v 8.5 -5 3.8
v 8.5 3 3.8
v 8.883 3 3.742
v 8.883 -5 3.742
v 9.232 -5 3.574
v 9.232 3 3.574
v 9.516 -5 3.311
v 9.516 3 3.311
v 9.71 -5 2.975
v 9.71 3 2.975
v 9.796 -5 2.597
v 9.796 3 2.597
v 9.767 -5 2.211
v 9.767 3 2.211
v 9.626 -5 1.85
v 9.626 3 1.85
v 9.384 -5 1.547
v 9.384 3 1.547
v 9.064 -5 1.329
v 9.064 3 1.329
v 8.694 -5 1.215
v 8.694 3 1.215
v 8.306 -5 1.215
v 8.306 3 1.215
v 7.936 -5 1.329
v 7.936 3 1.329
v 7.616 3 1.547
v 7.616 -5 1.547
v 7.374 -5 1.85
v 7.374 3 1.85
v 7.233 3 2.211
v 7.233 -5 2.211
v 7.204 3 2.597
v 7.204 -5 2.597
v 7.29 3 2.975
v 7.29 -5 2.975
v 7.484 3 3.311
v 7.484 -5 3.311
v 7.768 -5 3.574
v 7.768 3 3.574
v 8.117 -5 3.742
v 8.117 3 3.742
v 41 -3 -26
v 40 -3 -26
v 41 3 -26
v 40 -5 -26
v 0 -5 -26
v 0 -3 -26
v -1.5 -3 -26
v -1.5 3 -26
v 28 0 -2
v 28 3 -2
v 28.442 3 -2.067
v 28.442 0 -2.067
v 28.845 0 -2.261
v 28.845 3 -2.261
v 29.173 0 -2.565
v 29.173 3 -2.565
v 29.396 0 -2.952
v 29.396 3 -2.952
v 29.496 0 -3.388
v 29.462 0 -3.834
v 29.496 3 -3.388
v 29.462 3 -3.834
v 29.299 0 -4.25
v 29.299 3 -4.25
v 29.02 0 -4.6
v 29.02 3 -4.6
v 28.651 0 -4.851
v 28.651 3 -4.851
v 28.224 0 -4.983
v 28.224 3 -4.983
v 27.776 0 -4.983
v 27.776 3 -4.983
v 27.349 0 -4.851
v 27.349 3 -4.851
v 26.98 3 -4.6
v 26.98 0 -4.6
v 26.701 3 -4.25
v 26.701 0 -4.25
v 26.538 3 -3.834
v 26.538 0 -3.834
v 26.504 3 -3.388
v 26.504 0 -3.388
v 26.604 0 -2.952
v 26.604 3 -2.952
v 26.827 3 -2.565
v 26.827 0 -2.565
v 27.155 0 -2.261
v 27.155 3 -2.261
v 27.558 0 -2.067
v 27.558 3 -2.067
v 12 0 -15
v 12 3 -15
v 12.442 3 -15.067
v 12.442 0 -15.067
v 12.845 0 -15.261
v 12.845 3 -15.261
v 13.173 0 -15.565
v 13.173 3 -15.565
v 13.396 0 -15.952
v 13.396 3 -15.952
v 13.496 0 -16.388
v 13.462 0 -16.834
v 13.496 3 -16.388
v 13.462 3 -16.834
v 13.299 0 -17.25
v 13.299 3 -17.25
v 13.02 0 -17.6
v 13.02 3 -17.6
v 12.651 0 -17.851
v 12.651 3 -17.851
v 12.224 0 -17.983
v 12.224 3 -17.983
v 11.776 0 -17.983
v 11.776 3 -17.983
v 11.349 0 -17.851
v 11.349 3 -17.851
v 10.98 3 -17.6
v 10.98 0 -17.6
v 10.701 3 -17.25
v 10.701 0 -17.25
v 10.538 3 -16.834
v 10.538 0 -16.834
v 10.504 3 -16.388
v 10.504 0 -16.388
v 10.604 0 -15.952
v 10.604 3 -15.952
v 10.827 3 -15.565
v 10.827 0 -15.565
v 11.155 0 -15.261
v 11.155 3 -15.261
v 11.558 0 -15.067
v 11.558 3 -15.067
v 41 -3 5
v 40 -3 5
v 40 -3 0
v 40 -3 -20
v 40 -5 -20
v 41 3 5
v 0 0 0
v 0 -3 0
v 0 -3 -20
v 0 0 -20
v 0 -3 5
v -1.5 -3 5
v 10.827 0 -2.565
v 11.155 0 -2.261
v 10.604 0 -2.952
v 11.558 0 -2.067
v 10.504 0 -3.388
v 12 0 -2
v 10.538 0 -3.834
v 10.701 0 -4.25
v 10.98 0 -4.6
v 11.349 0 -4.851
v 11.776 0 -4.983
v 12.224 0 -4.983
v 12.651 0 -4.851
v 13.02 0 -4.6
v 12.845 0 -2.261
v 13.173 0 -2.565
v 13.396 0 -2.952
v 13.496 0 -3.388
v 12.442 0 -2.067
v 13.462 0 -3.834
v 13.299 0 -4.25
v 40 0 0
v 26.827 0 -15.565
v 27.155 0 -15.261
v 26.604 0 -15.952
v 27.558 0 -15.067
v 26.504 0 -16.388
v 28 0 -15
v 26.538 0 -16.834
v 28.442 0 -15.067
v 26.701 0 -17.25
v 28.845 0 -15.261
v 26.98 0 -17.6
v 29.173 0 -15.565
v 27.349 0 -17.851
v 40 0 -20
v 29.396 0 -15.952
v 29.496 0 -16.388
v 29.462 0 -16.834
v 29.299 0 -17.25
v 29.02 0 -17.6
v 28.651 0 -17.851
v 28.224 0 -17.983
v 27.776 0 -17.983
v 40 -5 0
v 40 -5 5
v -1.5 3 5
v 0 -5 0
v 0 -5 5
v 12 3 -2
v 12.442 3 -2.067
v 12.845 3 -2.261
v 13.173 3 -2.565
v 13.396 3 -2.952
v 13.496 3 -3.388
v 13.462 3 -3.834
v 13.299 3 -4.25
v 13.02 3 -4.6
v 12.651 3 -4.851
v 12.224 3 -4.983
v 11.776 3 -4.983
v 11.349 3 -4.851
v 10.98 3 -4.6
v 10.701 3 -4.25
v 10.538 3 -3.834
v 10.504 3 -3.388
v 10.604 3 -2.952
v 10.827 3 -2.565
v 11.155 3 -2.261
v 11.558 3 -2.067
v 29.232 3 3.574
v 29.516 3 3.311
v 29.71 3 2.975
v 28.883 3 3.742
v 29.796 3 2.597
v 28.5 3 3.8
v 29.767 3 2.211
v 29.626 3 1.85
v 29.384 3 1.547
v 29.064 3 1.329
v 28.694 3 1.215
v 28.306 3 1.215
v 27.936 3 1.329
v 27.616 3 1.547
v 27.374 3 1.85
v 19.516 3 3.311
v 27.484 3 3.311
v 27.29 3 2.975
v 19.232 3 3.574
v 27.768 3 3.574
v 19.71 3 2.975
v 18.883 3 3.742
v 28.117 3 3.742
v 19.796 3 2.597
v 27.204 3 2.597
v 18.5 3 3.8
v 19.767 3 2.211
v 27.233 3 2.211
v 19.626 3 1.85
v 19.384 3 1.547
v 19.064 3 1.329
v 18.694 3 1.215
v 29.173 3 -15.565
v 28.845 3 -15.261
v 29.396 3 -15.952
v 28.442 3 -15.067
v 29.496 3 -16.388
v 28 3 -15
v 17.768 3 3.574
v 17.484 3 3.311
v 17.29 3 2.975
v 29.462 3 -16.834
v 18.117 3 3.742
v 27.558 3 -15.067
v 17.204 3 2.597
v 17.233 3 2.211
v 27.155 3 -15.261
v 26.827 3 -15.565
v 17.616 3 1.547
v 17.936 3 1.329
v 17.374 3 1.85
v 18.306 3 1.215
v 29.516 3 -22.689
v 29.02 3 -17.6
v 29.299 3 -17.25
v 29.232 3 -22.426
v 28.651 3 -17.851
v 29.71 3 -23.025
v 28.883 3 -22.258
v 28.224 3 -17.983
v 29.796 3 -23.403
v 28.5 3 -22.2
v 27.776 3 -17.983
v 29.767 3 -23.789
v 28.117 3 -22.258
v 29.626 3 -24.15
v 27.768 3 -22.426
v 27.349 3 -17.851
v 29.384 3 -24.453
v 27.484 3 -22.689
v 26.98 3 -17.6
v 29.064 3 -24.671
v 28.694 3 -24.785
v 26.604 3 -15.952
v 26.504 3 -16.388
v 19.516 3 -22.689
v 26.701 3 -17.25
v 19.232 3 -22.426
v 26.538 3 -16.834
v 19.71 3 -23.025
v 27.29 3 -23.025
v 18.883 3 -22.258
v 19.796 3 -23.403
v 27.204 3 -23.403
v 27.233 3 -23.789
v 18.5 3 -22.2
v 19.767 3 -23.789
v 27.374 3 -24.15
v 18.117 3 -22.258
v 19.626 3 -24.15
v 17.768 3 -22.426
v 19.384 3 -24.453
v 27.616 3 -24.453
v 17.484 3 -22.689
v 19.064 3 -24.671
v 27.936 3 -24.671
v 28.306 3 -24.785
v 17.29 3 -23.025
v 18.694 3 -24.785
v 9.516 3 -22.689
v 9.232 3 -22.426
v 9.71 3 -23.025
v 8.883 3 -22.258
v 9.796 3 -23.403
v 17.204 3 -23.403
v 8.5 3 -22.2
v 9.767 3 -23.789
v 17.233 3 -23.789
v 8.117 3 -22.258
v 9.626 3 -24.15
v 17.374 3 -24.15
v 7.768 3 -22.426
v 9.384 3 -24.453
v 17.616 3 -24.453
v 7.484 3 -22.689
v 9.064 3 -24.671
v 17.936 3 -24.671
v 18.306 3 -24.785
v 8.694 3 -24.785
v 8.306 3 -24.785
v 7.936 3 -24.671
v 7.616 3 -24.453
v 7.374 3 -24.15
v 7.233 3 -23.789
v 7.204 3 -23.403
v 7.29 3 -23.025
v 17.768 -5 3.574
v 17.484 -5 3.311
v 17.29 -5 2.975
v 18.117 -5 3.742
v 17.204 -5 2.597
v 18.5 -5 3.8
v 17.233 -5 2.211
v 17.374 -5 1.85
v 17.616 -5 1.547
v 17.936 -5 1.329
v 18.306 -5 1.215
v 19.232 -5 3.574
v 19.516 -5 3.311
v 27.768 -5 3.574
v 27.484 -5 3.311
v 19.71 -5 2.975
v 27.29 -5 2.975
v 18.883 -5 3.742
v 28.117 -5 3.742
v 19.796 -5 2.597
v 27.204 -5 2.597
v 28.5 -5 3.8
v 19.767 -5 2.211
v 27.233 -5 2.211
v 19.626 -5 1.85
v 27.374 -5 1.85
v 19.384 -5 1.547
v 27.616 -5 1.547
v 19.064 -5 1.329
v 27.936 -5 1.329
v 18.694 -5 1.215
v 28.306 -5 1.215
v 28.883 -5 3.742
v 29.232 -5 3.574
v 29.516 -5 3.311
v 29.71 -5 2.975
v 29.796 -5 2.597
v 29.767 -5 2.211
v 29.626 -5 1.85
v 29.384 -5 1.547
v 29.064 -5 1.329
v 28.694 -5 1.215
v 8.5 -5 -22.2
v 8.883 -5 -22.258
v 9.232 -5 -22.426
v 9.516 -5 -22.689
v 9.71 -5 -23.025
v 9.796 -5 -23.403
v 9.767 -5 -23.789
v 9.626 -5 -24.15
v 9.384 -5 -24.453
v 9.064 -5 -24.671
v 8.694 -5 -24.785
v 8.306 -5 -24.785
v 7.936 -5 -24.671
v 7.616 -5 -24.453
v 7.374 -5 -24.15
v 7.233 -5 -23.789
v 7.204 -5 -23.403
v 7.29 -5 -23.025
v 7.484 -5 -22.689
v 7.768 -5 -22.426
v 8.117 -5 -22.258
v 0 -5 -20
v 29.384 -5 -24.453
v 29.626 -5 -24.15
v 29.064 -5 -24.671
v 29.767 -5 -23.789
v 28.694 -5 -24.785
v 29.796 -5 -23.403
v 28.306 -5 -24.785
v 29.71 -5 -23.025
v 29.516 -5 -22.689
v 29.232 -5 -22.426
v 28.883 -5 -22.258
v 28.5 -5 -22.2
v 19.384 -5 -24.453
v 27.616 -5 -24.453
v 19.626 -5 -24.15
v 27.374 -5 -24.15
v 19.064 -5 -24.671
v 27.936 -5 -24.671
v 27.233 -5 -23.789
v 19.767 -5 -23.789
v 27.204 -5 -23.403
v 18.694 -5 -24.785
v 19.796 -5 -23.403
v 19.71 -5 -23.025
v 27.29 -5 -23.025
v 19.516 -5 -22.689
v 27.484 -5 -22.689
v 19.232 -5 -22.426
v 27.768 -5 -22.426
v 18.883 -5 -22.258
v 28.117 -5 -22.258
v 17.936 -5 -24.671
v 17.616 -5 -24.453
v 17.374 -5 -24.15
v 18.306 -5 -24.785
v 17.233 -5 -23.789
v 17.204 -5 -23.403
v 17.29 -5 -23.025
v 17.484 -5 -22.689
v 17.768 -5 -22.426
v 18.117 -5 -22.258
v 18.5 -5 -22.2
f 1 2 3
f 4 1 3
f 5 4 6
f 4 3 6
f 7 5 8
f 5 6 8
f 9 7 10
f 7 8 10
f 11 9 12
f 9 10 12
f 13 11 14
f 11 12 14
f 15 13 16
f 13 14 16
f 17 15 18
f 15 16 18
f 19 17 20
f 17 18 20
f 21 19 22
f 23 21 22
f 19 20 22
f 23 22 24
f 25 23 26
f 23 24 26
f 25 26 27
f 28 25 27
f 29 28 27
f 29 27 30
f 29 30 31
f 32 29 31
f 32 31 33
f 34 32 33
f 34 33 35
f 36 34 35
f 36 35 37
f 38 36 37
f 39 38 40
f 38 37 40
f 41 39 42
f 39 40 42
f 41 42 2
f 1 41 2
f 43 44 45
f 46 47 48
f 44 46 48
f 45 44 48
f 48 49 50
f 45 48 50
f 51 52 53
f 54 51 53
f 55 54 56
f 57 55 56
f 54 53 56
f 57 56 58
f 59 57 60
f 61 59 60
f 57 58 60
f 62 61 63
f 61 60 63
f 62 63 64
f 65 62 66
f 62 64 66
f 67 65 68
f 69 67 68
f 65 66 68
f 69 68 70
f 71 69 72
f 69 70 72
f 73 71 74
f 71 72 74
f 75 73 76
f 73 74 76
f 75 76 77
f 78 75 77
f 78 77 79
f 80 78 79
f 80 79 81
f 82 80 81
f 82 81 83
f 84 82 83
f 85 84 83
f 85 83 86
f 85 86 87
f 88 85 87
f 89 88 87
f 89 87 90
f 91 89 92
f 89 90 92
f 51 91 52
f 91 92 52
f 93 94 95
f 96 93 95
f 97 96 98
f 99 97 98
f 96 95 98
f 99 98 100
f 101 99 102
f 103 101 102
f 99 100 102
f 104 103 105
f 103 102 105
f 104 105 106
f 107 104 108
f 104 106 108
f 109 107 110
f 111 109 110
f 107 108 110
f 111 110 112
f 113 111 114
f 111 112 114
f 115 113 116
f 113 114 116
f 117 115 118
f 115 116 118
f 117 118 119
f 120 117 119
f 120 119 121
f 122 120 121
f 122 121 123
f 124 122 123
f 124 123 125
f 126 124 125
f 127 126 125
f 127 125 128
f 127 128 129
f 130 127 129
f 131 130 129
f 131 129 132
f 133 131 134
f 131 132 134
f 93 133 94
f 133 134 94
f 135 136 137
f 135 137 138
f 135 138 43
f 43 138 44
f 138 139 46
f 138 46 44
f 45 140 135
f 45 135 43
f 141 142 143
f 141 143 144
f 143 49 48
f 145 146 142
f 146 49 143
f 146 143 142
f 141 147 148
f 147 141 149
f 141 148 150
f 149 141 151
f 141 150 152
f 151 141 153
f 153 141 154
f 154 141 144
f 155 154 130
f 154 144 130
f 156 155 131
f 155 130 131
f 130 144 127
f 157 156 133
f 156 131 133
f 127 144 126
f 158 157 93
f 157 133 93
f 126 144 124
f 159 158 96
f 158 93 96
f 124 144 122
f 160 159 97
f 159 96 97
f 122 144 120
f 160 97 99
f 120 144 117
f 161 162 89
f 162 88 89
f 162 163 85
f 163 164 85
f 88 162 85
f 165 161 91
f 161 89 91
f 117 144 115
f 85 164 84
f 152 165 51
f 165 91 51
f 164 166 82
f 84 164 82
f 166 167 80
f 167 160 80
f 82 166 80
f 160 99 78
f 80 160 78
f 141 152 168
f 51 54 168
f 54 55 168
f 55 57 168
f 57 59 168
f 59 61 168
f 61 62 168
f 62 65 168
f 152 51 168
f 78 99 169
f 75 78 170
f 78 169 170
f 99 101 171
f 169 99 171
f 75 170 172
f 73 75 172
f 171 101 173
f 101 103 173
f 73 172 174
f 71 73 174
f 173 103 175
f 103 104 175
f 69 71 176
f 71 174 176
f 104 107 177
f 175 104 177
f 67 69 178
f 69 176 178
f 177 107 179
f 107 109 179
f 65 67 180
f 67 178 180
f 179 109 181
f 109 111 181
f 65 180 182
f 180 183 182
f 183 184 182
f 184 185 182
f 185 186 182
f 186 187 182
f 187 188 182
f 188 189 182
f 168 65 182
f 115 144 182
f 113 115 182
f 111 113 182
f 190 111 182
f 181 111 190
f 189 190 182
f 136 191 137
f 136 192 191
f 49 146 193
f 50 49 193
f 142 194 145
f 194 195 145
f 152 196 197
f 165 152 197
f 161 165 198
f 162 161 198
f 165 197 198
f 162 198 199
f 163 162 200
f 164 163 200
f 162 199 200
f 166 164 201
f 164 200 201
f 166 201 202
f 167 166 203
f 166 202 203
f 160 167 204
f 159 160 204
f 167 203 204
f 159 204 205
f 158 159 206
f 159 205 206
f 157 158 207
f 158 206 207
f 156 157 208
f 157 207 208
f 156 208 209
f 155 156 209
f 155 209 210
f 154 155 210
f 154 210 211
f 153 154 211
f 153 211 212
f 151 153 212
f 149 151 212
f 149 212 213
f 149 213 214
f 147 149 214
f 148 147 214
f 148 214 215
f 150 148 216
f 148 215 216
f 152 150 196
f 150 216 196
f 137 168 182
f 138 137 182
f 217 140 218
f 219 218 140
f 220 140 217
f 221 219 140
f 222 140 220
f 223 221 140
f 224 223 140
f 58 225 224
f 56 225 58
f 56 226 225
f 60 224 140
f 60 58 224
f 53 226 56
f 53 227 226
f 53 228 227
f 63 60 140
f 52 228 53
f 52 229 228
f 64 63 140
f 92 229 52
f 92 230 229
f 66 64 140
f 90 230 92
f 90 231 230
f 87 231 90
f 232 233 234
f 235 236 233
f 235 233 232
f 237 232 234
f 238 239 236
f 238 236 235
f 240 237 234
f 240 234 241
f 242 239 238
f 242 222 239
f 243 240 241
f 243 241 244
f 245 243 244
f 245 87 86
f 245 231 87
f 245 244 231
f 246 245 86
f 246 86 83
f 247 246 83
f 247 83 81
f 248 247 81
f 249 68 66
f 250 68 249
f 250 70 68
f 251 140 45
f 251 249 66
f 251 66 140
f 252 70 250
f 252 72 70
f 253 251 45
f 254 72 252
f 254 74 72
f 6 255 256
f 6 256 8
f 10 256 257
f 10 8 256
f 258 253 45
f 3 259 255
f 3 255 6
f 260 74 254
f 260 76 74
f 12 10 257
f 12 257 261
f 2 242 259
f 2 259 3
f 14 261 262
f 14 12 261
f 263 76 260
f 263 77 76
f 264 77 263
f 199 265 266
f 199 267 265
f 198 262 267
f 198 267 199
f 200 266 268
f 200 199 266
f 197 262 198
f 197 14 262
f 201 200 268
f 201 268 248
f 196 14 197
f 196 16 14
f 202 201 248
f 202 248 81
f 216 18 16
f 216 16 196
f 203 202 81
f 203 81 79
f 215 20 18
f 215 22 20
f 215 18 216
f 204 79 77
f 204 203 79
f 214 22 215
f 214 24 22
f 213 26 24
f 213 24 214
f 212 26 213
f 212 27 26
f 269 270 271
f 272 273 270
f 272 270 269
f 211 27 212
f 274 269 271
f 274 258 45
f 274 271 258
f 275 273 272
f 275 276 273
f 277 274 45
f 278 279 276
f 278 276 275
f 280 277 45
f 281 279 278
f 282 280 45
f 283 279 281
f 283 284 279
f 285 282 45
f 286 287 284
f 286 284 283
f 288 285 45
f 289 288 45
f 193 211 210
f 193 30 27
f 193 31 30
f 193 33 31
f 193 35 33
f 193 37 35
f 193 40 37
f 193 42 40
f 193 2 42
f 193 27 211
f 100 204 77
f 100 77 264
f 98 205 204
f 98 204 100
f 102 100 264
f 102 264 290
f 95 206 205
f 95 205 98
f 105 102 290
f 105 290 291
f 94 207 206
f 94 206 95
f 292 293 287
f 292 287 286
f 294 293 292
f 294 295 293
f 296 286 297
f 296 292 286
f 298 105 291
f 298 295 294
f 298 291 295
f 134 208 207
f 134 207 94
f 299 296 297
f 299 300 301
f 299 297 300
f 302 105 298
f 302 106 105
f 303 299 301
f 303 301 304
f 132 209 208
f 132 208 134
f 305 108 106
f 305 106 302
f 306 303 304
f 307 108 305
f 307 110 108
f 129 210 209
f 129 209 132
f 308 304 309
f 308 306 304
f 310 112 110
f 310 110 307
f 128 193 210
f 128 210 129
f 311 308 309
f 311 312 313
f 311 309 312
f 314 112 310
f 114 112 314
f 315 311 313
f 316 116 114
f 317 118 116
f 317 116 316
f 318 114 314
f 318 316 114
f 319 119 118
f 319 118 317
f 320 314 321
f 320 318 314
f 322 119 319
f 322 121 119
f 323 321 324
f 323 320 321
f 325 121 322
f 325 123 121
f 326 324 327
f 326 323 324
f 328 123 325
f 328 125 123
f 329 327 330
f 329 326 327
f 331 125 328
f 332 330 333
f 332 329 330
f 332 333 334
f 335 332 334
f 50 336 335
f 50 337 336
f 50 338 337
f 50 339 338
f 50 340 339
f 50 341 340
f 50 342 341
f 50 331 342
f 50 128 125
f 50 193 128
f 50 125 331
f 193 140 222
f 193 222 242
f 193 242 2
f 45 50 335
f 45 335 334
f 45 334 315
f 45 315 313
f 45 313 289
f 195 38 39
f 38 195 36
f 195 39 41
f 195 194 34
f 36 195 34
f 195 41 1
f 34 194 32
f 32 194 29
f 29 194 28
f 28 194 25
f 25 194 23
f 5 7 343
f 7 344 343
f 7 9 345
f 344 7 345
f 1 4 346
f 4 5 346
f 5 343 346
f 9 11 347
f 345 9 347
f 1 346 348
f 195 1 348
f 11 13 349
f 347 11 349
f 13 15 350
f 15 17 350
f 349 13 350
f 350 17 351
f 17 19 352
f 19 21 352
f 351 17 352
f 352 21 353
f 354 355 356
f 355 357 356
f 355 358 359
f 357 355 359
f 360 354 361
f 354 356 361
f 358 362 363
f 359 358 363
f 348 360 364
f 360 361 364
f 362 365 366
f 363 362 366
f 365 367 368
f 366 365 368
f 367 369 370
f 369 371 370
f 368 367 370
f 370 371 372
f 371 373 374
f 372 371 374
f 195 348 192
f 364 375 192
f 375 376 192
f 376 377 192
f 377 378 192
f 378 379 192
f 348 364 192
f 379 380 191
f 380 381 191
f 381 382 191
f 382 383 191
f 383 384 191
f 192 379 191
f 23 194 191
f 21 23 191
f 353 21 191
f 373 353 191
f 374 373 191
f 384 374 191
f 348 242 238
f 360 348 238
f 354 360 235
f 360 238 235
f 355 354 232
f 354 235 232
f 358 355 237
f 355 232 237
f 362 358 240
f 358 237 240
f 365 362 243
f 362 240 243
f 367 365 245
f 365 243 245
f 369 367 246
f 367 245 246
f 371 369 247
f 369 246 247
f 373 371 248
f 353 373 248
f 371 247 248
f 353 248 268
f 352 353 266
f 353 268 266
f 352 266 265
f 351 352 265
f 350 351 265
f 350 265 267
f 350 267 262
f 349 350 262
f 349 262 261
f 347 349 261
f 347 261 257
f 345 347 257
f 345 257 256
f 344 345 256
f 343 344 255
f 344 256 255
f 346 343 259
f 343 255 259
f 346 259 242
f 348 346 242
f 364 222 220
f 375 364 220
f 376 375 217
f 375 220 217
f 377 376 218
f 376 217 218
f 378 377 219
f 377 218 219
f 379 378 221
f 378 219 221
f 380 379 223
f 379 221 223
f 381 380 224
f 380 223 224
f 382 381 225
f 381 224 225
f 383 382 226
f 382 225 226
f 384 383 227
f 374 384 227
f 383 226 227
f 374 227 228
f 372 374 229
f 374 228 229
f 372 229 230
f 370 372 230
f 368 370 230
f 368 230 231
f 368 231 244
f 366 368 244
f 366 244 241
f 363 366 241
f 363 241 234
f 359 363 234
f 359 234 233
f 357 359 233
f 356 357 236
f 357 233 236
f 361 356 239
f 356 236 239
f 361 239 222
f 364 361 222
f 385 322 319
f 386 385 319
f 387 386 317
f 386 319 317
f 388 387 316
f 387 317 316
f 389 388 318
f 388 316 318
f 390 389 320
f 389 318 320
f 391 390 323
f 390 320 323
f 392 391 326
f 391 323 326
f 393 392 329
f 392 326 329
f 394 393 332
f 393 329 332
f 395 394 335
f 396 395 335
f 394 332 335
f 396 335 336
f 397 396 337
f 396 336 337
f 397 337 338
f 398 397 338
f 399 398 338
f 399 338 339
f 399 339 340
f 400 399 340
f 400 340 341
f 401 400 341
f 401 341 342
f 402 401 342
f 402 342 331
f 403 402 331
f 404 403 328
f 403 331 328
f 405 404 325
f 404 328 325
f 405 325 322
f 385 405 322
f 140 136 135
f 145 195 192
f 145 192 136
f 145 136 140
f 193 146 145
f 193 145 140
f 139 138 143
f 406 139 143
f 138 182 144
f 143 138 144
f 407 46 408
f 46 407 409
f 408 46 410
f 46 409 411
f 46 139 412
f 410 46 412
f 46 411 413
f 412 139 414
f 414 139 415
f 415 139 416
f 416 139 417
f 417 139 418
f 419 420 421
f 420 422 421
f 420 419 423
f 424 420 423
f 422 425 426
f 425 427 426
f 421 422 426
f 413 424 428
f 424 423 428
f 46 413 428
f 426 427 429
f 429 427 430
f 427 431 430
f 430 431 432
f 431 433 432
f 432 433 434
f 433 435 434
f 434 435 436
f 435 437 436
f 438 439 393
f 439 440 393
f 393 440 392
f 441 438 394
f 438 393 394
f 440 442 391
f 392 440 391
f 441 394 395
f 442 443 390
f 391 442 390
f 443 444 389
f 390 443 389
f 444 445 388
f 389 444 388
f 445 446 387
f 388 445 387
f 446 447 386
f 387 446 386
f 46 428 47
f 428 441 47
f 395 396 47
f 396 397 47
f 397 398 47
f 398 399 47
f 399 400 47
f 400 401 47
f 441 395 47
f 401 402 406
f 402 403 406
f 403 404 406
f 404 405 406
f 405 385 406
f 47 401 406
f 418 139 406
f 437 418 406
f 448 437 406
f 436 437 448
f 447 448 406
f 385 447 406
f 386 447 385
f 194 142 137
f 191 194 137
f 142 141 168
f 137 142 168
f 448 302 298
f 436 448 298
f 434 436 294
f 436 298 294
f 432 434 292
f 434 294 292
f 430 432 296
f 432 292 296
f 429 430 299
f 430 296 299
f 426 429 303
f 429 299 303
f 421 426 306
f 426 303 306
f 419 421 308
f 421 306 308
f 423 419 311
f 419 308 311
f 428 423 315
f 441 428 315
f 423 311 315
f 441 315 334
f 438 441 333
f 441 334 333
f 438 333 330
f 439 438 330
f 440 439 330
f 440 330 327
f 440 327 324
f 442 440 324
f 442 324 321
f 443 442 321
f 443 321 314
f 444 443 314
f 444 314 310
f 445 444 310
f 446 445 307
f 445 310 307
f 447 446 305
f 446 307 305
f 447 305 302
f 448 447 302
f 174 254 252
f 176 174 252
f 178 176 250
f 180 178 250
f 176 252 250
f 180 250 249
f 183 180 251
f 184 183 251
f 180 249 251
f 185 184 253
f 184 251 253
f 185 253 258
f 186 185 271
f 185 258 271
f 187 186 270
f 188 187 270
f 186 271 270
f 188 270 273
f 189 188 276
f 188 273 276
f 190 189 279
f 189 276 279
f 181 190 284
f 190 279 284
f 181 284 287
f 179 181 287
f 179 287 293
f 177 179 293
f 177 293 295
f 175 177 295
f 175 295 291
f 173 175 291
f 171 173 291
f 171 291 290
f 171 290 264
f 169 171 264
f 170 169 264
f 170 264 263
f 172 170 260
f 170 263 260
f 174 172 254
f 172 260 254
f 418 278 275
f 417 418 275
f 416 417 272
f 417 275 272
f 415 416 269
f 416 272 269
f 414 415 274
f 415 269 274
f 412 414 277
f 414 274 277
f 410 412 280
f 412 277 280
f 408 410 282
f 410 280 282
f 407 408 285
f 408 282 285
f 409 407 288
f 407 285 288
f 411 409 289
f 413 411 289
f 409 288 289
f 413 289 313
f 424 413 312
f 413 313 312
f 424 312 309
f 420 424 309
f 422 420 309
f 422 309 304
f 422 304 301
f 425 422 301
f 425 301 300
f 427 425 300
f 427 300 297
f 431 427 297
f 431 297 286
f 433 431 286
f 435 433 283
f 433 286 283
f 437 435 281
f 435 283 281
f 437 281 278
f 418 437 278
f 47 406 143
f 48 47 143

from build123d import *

# Parameters (mm, degrees)
SKETCH_1_W          = 40
SKETCH_1_H          = 20
EXTRUDE_1_DEPTH     = 3
SKETCH_2_R          = 1.5
CUT_EXTRUDE_1_DEPTH = 3
SKETCH_3_W          = 40
SKETCH_3_H          = 8
EXTRUDE_2_DEPTH     = 5
SKETCH_4_W          = 40
SKETCH_4_H          = 8
EXTRUDE_3_DEPTH     = 6
SKETCH_6_R          = 1.3
CUT_EXTRUDE_2_DEPTH = 8
SKETCH_11_W         = 1.5
SKETCH_11_H         = 6
EXTRUDE_5_DEPTH     = 31
SKETCH_12_W         = 31
SKETCH_12_H         = 6
EXTRUDE_6_DEPTH     = 1


with BuildPart() as part:
    # 草圖1 → 填料-伸長1 (new body)
    with BuildSketch(Plane(origin=(0, 0, 0), x_dir=(1, 0, 0), z_dir=(0, 1, 0))):
        with Locations((20, 10)):
            Rectangle(SKETCH_1_W, SKETCH_1_H)
    extrude(amount=EXTRUDE_1_DEPTH)

    # 草圖2 → 除料-伸長1 (cut)
    with BuildSketch(Plane(origin=(0, 3, 0), x_dir=(1, 0, 0), z_dir=(0, 1, 0))):
        with Locations(Location((28, 16.5, 0), (0, 0, 270))):
            Circle(SKETCH_2_R)
        with Locations(Location((12, 16.5, 0), (0, 0, 270))):
            Circle(SKETCH_2_R)
        with Locations(Location((12, 3.5, 0), (0, 0, 270))):
            Circle(SKETCH_2_R)
        with Locations(Location((28, 3.5, 0), (0, 0, 270))):
            Circle(SKETCH_2_R)
    extrude(amount=-CUT_EXTRUDE_1_DEPTH, mode=Mode.SUBTRACT)

    # 草圖3 → 填料-伸長2 (add)
    with BuildSketch(Plane.XY):
        with Locations((20, -1)):
            Rectangle(SKETCH_3_W, SKETCH_3_H)
    extrude(amount=EXTRUDE_2_DEPTH)

    # 草圖4 → 填料-伸長3 (add)
    with BuildSketch(Plane(origin=(0, 0, -20), x_dir=(-1, 0, 0), z_dir=(0, 0, -1))):
        with Locations((-20, -1)):
            Rectangle(SKETCH_4_W, SKETCH_4_H)
    extrude(amount=EXTRUDE_3_DEPTH)

    # 草圖6 → 除料-伸長2 (cut)
    with BuildSketch(Plane(origin=(0, 3, 0), x_dir=(1, 0, 0), z_dir=(0, 1, 0))):
        with Locations(Location((8.5, 23.5, 0), (0, 0, 270))):
            Circle(SKETCH_6_R)
        with Locations(Location((18.5, 23.5, 0), (0, 0, 270))):
            Circle(SKETCH_6_R)
        with Locations(Location((28.5, 23.5, 0), (0, 0, 270))):
            Circle(SKETCH_6_R)
        with Locations(Location((8.5, -2.5, 0), (0, 0, 270))):
            Circle(SKETCH_6_R)
        with Locations(Location((18.5, -2.5, 0), (0, 0, 270))):
            Circle(SKETCH_6_R)
        with Locations(Location((28.5, -2.5, 0), (0, 0, 270))):
            Circle(SKETCH_6_R)
    extrude(amount=-CUT_EXTRUDE_2_DEPTH, mode=Mode.SUBTRACT)

    # 草圖11 → 填料-伸長5 (add)
    with BuildSketch(Plane.XY.offset(5)):
        with Locations((-0.75, 0)):
            Rectangle(SKETCH_11_W, SKETCH_11_H)
    extrude(amount=-EXTRUDE_5_DEPTH)

    # 草圖12 → 填料-伸長6 (add)
    with BuildSketch(Plane(origin=(40, 0, 0), x_dir=(0, 0, -1), z_dir=(1, 0, 0))):
        with Locations((10.5, 0)):
            Rectangle(SKETCH_12_W, SKETCH_12_H)
    extrude(amount=EXTRUDE_6_DEPTH)


solid = part.part
